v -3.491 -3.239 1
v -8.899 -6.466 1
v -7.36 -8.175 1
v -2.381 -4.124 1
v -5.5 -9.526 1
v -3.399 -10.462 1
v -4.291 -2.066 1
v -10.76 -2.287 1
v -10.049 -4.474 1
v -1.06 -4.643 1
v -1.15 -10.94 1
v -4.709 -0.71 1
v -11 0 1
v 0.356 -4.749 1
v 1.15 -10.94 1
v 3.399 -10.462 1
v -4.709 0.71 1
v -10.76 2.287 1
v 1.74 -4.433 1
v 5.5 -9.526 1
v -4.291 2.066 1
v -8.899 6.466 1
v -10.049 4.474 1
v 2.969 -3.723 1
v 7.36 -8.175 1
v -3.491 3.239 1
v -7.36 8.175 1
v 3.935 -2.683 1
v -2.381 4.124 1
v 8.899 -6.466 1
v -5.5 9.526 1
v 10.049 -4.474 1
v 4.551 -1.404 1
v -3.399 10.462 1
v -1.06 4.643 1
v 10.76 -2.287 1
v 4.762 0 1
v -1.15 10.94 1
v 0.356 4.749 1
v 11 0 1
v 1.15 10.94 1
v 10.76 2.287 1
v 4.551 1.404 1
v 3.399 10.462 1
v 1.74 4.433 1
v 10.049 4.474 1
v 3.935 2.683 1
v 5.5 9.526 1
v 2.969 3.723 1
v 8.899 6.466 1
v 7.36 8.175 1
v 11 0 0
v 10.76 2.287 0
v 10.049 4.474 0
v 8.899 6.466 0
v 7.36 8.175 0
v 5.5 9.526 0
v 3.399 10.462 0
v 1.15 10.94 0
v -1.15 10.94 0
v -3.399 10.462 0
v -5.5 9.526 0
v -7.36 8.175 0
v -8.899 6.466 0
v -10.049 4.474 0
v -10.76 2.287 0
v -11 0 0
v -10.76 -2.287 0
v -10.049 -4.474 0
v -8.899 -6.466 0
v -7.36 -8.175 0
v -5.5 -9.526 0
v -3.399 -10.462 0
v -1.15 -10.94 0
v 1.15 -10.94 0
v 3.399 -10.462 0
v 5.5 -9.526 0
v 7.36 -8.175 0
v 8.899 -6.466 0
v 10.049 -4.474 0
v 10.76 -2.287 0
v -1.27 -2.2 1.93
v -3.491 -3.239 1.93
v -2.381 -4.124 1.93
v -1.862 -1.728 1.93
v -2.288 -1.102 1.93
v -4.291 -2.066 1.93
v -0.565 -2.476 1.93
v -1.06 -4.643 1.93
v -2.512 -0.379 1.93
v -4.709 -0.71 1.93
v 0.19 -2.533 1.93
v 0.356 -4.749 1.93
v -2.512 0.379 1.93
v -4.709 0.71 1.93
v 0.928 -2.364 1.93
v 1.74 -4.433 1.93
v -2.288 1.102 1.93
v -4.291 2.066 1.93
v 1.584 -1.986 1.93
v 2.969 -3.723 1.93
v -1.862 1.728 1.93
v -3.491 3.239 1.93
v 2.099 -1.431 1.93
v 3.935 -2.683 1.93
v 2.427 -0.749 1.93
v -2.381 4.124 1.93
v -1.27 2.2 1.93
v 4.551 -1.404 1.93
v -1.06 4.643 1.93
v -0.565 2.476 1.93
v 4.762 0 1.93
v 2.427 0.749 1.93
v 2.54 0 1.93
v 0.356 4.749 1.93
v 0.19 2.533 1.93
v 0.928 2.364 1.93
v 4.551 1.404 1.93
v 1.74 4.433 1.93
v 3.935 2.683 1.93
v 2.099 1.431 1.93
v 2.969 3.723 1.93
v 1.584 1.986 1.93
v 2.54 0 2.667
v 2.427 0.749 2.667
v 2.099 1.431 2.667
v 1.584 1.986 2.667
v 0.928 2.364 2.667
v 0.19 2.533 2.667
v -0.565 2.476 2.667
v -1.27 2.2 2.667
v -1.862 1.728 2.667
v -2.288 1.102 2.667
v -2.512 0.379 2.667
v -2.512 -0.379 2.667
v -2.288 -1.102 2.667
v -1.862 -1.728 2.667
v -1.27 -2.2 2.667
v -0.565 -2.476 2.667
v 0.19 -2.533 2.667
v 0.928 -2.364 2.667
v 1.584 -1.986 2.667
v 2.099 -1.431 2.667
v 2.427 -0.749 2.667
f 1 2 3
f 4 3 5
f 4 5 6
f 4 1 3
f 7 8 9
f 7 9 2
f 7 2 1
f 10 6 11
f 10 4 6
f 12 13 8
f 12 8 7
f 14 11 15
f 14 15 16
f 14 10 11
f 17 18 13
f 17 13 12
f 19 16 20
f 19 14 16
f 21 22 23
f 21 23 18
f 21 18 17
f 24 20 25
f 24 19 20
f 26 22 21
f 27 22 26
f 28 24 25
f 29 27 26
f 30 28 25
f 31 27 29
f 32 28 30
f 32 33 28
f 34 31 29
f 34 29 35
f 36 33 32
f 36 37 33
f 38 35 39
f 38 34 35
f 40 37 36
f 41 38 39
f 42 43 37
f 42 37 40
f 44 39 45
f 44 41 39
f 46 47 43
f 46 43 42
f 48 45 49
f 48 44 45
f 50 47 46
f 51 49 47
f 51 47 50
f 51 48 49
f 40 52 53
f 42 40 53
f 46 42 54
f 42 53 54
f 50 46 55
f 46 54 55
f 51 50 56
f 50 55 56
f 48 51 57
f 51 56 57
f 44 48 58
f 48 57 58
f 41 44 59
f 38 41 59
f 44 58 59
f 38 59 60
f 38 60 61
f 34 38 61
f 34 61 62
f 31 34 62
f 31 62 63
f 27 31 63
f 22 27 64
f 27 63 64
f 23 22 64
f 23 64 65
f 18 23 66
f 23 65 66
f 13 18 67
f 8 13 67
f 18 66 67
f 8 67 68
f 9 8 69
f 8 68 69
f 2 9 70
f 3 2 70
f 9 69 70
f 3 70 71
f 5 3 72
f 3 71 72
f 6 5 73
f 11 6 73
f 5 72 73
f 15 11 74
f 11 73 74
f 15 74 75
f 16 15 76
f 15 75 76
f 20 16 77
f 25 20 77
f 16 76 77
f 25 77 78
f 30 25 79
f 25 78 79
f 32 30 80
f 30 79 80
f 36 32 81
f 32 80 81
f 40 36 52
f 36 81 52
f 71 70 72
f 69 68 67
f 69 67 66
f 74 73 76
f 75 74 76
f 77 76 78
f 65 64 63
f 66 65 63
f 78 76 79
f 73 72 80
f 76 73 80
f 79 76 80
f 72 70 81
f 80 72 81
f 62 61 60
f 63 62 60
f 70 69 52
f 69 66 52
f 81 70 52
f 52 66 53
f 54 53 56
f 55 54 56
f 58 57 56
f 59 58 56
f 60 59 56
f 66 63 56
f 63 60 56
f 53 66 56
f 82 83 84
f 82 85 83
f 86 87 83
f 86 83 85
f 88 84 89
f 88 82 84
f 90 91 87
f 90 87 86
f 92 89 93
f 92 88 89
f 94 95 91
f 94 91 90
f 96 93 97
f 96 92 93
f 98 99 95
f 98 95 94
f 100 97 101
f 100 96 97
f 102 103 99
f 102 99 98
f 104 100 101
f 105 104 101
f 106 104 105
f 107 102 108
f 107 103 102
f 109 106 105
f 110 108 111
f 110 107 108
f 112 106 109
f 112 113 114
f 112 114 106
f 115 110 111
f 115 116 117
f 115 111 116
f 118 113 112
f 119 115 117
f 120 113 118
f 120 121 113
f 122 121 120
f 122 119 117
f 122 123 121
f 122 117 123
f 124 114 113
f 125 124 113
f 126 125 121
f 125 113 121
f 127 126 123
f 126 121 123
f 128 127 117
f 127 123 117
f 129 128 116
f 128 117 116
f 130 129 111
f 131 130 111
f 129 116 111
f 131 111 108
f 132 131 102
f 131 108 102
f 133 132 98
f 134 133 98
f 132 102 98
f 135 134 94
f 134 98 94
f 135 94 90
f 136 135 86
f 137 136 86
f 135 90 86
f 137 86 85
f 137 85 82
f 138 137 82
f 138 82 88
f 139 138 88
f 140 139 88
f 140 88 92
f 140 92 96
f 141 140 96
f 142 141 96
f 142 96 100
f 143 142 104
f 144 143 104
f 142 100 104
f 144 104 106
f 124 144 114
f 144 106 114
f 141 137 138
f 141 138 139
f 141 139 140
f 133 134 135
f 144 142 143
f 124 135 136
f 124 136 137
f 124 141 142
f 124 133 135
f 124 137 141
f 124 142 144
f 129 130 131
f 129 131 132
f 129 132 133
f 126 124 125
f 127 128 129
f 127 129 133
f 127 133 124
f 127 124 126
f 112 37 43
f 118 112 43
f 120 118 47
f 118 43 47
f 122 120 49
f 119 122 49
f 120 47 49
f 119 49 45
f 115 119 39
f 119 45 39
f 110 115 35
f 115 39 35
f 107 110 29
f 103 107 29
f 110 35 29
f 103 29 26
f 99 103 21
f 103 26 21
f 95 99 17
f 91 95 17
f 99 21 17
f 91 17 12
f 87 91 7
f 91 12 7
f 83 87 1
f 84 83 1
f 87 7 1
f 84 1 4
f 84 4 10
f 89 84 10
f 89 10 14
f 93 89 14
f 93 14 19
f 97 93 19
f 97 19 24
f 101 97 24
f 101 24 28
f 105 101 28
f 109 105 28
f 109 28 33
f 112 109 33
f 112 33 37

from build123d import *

# Parameters (mm, degrees)
F0_R     = 4.7625
F0_R_2   = 2.613606
F1_DEPTH = 1.9304
F0_R_3   = 11
F2_DEPTH = 1
F3_R     = 2.54
F4_DEPTH = 0.7366


with BuildPart() as f1:
    # F0 (on Top) → F1 (new body)
    with BuildSketch(Plane.XY):
        Circle(F0_R)
        Circle(F0_R_2, mode=Mode.SUBTRACT)
        Circle(F0_R_2)
    extrude(amount=F1_DEPTH)

    # F0 (on Top) → F2 (join)
    with BuildSketch(Plane.XY):
        Circle(F0_R_3)
        Circle(F0_R, mode=Mode.SUBTRACT)
    extrude(amount=F2_DEPTH)

    # F3 (on face) → F4 (join)
    with BuildSketch(Plane.XY.offset(1.9304)):
        Circle(F3_R)
    extrude(amount=F4_DEPTH)


solid = f1.part
